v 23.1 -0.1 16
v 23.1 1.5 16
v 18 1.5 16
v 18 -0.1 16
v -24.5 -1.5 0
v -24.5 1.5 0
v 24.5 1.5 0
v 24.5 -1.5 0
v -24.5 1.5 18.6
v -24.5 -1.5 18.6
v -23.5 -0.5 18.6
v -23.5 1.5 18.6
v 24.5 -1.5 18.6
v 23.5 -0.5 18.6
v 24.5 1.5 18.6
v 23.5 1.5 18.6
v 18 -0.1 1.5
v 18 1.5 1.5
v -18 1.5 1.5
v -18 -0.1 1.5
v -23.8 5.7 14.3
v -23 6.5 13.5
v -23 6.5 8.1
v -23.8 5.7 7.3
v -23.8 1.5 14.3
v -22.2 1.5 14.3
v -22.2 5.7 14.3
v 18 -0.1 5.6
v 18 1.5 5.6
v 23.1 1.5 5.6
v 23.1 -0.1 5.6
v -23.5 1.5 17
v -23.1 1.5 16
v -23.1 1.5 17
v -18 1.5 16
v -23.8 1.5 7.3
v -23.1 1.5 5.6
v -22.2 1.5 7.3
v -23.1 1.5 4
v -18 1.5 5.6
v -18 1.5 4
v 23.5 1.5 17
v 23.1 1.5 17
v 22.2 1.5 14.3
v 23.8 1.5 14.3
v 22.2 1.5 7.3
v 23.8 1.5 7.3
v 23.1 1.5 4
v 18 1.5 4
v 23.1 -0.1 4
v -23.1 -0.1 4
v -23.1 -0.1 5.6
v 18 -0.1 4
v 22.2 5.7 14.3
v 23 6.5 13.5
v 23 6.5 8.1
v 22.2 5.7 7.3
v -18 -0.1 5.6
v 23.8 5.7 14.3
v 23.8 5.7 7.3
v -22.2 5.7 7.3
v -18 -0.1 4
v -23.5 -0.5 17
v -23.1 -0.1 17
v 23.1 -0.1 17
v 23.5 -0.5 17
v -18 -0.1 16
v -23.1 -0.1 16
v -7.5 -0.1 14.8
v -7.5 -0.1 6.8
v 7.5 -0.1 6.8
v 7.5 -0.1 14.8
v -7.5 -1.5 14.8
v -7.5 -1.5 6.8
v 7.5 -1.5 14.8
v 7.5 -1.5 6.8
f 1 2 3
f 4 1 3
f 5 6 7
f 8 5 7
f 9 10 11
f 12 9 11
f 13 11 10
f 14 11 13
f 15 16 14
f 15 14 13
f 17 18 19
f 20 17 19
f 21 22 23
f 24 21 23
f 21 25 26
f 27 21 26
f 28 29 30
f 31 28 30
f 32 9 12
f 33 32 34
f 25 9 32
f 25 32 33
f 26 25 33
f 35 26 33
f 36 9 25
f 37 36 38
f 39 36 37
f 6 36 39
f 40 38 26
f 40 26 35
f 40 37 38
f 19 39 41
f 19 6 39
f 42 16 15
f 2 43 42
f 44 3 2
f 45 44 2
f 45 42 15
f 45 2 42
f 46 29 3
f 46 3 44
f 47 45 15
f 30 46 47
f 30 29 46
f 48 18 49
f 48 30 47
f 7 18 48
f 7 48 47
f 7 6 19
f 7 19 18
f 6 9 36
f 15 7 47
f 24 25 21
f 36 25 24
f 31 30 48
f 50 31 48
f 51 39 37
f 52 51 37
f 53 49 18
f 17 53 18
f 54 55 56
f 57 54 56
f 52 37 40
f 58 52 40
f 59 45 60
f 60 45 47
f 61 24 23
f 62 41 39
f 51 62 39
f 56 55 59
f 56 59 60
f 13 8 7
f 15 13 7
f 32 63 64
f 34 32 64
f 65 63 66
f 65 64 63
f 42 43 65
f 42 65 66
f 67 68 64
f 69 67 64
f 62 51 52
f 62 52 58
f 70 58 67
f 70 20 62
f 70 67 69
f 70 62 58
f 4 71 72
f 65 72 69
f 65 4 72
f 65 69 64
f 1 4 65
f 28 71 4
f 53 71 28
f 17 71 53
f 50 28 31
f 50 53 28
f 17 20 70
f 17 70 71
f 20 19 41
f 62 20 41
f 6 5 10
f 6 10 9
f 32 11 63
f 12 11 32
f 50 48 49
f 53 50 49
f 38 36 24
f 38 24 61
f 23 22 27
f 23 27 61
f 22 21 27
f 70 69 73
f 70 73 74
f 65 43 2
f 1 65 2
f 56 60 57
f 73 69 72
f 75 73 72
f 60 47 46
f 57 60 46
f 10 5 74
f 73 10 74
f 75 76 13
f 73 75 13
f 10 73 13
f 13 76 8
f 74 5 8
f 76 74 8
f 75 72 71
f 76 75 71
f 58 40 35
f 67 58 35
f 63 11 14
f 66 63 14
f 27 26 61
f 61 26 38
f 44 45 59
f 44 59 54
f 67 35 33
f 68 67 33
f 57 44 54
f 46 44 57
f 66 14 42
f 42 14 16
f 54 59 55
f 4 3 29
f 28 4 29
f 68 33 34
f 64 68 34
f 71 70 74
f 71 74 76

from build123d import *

# Parameters (mm, degrees)
ESQUISSE1_W                  = 49
ESQUISSE1_H                  = 3
BOSS_EXTRU_1_DEPTH           = 18.6
ENL_V_MAT_EXTRU_2_DEPTH      = 1.6
ENL_V_MAT_EXTRU_3_REACH      = 32.802
ESQUISSE6_W                  = 15
ESQUISSE6_H                  = 8
ESQUISSE7_W                  = 1.6
ESQUISSE7_H                  = 7
BOSS_EXTRU_2_DEPTH           = 5
CHANFREIN1_SIZE              = 0.8
CHANFREIN1_OF_SYM_TRIE1_SIZE = 0.8
ESQUISSE8_W                  = 47
ESQUISSE8_H                  = 2
ENL_V_MAT_EXTRU_4_DEPTH      = 1.6


with BuildPart() as part:
    # Esquisse1 → Boss.-Extru.1 (new body)
    with BuildSketch(Plane.XY):
        Rectangle(ESQUISSE1_W, ESQUISSE1_H)
    extrude(amount=BOSS_EXTRU_1_DEPTH)

    # Esquisse5 → Enlèv. mat.-Extru.2 (cut)
    with BuildSketch(Plane(origin=(0, 1.5, 0), x_dir=(1, 0, 0), z_dir=(0, 1, 0))):
        Polygon((-23.1, -4), (-23.1, -5.6), (-18, -5.6), (-18, -16), (-23.1, -16), (-23.1, -17.6), (23.1, -17.6), (23.1, -16), (18, -16), (18, -5.6), (23.1, -5.6), (23.1, -4), (18, -4), (18, -1.5), (-18, -1.5), (-18, -4), align=None)
    extrude(amount=-ENL_V_MAT_EXTRU_2_DEPTH, mode=Mode.SUBTRACT)

    # Esquisse6 → Enlèv. mat.-Extru.3 (cut, up to next)
    with BuildSketch(Plane(origin=(0, -0.1, 0), x_dir=(1, 0, 0), z_dir=(0, 1, 0)), mode=Mode.PRIVATE) as enl_v_mat_extru_3_sk1:
        with Locations((0, -10.8)):
            Rectangle(ESQUISSE6_W, ESQUISSE6_H)
    enl_v_mat_extru_3_tool1 = extrude(enl_v_mat_extru_3_sk1.sketch, amount=-ENL_V_MAT_EXTRU_3_REACH, mode=Mode.PRIVATE) & part.part
    add(enl_v_mat_extru_3_tool1.solids().sort_by_distance((0, -0.1, 10.8))[0], mode=Mode.SUBTRACT)

    # Esquisse7 → Boss.-Extru.2 (add)
    with BuildSketch(Plane(origin=(0, 1.5, 0), x_dir=(1, 0, 0), z_dir=(0, 1, 0))):
        with Locations((-23, -10.8)):
            Rectangle(ESQUISSE7_W, ESQUISSE7_H)
    boss_extru_2 = extrude(amount=BOSS_EXTRU_2_DEPTH)

    # Chanfrein1
    chanfrein1_edges = [part.edges().sort_by_distance(p)[0] for p in [
        (-22.2, 6.5, 10.8),
        (-23, 6.5, 7.3),
        (-23.8, 6.5, 10.8),
        (-23, 6.5, 14.3),
    ]]
    chamfer(chanfrein1_edges, length=CHANFREIN1_SIZE - 0.0001)  # a hair under: the kernel refuses the full size

    # Symétrie1: Boss.-Extru.2 across plane
    add(boss_extru_2.mirror(Plane(origin=(0, 0, 0), x_dir=(0, 0, 1), z_dir=(1, 0, 0))))

    # Chanfrein1 of Symétrie1
    chanfrein1_of_sym_trie1_edges = [part.edges().sort_by_distance(p)[0] for p in [
        (22.2, 6.5, 10.8),
        (23, 6.5, 7.3),
        (23.8, 6.5, 10.8),
        (23, 6.5, 14.3),
    ]]
    chamfer(chanfrein1_of_sym_trie1_edges, length=CHANFREIN1_OF_SYM_TRIE1_SIZE - 0.0001)  # a hair under: the kernel refuses the full size

    # Esquisse8 → Enlèv. mat.-Extru.4 (cut)
    with BuildSketch(Plane.XY.offset(18.6)):
        with Locations((0, 0.5)):
            Rectangle(ESQUISSE8_W, ESQUISSE8_H)
    extrude(amount=-ENL_V_MAT_EXTRU_4_DEPTH, mode=Mode.SUBTRACT)


solid = part.part
